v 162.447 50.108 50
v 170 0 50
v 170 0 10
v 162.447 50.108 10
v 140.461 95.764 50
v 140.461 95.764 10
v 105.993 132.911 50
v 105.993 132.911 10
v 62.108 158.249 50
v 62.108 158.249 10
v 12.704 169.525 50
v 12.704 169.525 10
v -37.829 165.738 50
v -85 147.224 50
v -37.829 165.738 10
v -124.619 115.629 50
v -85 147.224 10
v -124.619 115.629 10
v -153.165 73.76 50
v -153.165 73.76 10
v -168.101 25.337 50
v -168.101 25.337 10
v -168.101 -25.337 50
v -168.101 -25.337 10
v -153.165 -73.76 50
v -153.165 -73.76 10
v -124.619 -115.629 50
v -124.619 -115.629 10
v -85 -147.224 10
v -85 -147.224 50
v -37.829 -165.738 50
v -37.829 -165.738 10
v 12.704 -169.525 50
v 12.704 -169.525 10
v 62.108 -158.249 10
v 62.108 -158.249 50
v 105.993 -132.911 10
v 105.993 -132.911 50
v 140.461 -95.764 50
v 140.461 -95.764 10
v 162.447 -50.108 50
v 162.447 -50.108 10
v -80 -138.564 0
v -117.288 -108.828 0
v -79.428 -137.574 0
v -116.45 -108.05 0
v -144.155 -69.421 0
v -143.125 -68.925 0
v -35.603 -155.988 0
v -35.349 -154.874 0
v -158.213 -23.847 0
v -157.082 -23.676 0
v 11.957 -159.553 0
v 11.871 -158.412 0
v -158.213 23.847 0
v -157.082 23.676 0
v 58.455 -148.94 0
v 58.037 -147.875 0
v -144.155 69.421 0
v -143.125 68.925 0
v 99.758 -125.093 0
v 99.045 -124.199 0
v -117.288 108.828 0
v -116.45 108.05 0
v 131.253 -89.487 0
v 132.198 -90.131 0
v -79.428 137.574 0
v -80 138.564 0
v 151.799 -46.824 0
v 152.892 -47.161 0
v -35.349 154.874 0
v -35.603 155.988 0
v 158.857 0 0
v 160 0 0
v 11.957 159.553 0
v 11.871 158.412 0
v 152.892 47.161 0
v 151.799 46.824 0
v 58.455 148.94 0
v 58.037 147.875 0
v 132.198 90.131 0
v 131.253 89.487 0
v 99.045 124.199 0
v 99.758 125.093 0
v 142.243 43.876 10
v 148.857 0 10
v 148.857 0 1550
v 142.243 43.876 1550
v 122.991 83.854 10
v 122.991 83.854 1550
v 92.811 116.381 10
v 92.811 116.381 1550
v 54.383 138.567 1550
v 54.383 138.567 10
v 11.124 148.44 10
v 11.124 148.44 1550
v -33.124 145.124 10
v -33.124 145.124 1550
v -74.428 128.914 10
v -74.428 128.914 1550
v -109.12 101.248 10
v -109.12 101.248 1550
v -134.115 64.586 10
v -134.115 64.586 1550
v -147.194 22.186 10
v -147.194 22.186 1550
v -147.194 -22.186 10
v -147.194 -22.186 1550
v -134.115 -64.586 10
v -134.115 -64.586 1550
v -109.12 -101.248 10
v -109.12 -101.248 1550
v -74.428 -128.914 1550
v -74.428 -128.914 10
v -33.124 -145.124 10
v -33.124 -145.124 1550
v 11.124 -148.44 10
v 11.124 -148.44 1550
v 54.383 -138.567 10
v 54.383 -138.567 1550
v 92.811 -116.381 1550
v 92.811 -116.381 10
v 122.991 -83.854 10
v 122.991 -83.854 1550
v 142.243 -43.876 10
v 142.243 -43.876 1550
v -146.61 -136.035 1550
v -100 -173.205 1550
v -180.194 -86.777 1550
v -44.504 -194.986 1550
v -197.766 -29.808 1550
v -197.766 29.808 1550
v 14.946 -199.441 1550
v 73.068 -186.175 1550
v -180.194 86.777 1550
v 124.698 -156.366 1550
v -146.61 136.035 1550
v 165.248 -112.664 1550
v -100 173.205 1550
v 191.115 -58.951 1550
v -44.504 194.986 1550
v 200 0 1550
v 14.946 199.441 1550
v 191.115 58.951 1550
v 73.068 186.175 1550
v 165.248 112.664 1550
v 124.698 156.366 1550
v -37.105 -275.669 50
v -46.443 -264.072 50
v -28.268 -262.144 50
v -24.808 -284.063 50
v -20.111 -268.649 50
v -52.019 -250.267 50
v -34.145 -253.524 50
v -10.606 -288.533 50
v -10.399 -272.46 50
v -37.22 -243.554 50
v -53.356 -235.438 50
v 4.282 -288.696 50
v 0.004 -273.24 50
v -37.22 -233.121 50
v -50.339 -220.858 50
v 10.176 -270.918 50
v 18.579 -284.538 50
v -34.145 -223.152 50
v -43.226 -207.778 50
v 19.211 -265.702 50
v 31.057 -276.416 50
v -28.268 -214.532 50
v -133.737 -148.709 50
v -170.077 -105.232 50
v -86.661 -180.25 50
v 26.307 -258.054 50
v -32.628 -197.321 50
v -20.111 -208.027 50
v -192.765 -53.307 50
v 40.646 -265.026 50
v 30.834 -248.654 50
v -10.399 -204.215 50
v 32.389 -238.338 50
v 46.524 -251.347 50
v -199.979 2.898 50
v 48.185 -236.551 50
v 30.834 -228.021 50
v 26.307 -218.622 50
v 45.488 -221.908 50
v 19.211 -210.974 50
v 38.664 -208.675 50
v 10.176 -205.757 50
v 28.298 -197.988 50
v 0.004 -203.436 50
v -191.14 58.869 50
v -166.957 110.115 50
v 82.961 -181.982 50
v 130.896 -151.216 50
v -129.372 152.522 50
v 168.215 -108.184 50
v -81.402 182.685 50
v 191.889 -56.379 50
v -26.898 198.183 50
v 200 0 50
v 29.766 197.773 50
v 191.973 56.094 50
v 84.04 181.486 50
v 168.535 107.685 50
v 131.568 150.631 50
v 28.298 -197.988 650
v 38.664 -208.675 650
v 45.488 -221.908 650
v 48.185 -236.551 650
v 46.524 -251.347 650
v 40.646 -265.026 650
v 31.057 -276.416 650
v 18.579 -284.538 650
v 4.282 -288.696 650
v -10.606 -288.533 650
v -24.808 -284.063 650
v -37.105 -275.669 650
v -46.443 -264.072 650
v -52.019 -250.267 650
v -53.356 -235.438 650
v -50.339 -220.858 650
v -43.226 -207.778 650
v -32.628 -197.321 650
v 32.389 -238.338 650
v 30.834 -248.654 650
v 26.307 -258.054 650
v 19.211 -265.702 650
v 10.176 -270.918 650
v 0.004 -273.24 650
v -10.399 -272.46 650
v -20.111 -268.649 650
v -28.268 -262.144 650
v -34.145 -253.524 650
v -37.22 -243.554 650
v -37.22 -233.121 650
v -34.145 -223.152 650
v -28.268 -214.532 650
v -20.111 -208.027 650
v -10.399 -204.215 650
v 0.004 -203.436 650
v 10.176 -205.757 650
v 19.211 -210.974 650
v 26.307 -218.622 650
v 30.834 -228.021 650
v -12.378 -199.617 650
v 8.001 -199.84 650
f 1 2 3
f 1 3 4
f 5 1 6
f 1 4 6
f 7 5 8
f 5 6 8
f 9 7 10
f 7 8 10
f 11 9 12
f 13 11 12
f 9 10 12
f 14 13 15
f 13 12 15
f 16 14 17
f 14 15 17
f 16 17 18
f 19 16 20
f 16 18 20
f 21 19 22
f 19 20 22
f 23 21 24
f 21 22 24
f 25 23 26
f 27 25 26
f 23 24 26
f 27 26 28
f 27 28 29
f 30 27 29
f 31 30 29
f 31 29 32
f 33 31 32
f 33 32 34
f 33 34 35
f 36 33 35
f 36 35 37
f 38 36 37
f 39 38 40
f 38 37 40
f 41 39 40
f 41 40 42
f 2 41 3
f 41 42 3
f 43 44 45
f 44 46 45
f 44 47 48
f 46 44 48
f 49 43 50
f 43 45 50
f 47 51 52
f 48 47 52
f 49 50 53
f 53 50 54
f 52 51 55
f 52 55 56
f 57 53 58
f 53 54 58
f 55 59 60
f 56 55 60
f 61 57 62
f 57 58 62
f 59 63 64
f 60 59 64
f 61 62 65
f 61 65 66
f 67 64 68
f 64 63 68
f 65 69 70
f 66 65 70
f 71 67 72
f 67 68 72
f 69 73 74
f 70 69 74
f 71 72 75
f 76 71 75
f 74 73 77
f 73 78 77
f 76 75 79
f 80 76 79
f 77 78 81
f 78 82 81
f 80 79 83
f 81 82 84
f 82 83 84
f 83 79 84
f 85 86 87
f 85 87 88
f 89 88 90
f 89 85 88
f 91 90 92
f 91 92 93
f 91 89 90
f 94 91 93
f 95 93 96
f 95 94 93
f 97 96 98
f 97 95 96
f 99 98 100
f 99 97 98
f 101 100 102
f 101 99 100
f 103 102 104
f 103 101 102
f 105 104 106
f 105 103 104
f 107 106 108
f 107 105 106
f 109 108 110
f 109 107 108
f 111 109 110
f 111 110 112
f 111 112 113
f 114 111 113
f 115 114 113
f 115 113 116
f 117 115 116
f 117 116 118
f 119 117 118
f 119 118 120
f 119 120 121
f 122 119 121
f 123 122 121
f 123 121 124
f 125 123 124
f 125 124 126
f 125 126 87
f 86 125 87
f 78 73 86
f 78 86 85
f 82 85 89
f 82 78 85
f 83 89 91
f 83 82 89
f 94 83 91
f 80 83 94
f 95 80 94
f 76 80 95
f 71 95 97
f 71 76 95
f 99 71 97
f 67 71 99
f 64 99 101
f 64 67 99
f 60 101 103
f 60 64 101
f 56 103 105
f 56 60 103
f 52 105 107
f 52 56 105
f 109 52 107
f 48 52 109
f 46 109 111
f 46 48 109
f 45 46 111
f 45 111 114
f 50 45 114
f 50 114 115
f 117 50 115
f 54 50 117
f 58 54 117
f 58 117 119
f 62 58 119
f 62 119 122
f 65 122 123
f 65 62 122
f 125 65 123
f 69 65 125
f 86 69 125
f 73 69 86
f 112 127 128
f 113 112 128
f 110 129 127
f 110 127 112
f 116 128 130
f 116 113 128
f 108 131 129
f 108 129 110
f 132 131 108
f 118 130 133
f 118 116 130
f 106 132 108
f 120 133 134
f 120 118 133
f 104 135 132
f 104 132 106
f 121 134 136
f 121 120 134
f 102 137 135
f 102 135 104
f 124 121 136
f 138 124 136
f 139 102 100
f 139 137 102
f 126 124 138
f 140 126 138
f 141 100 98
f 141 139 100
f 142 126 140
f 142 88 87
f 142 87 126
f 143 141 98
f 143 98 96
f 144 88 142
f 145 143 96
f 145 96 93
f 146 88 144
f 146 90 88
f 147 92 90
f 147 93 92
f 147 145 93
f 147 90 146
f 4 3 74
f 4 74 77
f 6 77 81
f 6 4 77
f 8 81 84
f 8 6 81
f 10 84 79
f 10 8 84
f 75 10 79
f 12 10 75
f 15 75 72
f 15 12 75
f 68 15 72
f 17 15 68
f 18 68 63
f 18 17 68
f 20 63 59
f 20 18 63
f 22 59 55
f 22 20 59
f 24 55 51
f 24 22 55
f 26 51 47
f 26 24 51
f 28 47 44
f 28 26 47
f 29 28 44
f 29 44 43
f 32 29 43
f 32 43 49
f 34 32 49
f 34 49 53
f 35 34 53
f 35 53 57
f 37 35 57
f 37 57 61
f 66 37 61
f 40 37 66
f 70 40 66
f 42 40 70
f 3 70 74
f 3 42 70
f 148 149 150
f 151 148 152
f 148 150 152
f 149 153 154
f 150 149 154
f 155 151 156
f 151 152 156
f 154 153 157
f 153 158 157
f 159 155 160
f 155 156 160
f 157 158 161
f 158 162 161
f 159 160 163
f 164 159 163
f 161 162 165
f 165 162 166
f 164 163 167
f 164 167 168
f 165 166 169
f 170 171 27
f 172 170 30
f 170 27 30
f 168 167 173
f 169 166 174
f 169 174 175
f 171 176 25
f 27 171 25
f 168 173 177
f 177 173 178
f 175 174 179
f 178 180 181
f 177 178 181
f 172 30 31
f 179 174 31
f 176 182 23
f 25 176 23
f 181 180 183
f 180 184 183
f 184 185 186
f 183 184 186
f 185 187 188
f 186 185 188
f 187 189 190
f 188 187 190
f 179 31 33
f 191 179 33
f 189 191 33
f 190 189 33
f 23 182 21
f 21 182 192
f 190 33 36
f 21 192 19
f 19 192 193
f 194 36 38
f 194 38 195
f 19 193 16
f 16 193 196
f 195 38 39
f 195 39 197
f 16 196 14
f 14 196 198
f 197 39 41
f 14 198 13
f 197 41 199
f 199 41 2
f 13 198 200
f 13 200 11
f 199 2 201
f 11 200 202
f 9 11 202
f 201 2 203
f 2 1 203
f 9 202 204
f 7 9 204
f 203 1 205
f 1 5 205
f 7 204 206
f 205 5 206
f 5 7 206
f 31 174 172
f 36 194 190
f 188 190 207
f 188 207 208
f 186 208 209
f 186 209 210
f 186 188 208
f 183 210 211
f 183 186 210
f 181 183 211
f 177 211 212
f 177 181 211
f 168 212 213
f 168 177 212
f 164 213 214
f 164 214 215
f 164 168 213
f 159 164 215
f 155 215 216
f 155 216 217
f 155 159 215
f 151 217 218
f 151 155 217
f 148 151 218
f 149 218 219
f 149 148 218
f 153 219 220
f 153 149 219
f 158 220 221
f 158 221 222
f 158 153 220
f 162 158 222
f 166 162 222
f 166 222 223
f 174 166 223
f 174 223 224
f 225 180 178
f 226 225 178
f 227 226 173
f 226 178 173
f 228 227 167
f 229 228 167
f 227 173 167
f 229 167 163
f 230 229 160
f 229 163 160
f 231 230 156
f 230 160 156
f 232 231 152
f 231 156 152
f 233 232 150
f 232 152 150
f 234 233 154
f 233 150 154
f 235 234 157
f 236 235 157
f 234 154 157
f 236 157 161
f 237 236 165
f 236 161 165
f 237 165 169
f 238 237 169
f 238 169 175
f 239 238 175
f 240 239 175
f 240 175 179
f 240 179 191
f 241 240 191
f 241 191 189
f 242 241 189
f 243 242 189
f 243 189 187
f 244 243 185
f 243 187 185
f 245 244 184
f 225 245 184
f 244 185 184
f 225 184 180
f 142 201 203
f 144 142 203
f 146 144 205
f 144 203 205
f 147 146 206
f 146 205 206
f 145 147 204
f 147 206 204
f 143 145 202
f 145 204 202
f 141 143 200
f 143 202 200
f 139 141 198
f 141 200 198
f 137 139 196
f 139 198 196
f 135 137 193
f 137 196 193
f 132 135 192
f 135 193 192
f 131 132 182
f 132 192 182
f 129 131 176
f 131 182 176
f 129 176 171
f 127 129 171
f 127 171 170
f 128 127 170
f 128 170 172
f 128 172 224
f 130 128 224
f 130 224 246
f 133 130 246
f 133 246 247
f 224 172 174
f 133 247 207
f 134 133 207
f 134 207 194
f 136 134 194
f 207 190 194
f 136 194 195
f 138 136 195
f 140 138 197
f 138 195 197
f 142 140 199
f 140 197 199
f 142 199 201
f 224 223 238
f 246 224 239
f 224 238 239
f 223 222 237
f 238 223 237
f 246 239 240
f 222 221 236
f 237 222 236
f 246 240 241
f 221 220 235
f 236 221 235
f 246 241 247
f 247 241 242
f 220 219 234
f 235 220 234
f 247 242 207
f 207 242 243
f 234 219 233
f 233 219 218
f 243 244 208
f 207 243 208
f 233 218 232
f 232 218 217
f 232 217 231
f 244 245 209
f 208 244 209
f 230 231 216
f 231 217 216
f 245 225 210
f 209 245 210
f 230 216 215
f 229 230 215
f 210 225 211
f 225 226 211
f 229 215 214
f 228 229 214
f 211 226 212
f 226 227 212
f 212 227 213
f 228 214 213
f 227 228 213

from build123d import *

# Parameters (mm, degrees)
F0_R        = 170
F0_R_2      = 148.8565935533
F1_DEPTH    = 50
F1_FACE_R   = 170
F1_FACE_R_2 = 148.8565935533
F2_R        = 200
F2_R_2      = 170
F3_DEPTH    = 1500
F4_SIZE     = 10
F6_DEPTH    = 600
F7_R        = 35
F8_DEPTH    = 600


with BuildPart() as f1:
    # F0 (on Top) → F1 (new body)
    with BuildSketch(Plane.XY):
        Circle(F0_R)
        Circle(F0_R_2, mode=Mode.SUBTRACT)
    extrude(amount=F1_DEPTH)

    # F1_face (on face) + F2 (on face) → F3 (join)
    with BuildSketch(Plane.XY.offset(50)):
        Circle(F1_FACE_R)
        Circle(F1_FACE_R_2, mode=Mode.SUBTRACT)
    with BuildSketch(Plane.XY.offset(50)):
        Circle(F2_R)
        Circle(F2_R_2, mode=Mode.SUBTRACT)
    extrude(amount=F3_DEPTH)

    # F4
    f4_edges = [f1.edges().sort_by_distance(p)[0] for p in [
        (-170, 0, 0),
        (-148.856594, 0, 0),
    ]]
    chamfer(f4_edges, length=F4_SIZE)

    # F5 (on face) → F6 (join)
    with BuildSketch(Plane(origin=(0, 0, 50), x_dir=(1, 0, 0), z_dir=(0, 0, -1))):
        with BuildLine():
            ThreePointArc((-32.6282500588, 197.3205445414), (-2.1909388027, 199.9879991079), (28.2975059651, 197.9880076069))
            ThreePointArc((28.2975059651, 197.9880076069), (-3.1678765377, 289.1624765686), (-32.6282500588, 197.3205445414))
        make_face()
    extrude(amount=-F6_DEPTH)

    # F7 (on face) → F8 (cut)
    with BuildSketch(Plane(origin=(0, 0, 50), x_dir=(1, 0, 0), z_dir=(0, 0, -1))):
        with Locations((-2.6110750469, 238.3378638878)):
            Circle(F7_R)
    extrude(amount=-F8_DEPTH, mode=Mode.SUBTRACT)


solid = f1.part
